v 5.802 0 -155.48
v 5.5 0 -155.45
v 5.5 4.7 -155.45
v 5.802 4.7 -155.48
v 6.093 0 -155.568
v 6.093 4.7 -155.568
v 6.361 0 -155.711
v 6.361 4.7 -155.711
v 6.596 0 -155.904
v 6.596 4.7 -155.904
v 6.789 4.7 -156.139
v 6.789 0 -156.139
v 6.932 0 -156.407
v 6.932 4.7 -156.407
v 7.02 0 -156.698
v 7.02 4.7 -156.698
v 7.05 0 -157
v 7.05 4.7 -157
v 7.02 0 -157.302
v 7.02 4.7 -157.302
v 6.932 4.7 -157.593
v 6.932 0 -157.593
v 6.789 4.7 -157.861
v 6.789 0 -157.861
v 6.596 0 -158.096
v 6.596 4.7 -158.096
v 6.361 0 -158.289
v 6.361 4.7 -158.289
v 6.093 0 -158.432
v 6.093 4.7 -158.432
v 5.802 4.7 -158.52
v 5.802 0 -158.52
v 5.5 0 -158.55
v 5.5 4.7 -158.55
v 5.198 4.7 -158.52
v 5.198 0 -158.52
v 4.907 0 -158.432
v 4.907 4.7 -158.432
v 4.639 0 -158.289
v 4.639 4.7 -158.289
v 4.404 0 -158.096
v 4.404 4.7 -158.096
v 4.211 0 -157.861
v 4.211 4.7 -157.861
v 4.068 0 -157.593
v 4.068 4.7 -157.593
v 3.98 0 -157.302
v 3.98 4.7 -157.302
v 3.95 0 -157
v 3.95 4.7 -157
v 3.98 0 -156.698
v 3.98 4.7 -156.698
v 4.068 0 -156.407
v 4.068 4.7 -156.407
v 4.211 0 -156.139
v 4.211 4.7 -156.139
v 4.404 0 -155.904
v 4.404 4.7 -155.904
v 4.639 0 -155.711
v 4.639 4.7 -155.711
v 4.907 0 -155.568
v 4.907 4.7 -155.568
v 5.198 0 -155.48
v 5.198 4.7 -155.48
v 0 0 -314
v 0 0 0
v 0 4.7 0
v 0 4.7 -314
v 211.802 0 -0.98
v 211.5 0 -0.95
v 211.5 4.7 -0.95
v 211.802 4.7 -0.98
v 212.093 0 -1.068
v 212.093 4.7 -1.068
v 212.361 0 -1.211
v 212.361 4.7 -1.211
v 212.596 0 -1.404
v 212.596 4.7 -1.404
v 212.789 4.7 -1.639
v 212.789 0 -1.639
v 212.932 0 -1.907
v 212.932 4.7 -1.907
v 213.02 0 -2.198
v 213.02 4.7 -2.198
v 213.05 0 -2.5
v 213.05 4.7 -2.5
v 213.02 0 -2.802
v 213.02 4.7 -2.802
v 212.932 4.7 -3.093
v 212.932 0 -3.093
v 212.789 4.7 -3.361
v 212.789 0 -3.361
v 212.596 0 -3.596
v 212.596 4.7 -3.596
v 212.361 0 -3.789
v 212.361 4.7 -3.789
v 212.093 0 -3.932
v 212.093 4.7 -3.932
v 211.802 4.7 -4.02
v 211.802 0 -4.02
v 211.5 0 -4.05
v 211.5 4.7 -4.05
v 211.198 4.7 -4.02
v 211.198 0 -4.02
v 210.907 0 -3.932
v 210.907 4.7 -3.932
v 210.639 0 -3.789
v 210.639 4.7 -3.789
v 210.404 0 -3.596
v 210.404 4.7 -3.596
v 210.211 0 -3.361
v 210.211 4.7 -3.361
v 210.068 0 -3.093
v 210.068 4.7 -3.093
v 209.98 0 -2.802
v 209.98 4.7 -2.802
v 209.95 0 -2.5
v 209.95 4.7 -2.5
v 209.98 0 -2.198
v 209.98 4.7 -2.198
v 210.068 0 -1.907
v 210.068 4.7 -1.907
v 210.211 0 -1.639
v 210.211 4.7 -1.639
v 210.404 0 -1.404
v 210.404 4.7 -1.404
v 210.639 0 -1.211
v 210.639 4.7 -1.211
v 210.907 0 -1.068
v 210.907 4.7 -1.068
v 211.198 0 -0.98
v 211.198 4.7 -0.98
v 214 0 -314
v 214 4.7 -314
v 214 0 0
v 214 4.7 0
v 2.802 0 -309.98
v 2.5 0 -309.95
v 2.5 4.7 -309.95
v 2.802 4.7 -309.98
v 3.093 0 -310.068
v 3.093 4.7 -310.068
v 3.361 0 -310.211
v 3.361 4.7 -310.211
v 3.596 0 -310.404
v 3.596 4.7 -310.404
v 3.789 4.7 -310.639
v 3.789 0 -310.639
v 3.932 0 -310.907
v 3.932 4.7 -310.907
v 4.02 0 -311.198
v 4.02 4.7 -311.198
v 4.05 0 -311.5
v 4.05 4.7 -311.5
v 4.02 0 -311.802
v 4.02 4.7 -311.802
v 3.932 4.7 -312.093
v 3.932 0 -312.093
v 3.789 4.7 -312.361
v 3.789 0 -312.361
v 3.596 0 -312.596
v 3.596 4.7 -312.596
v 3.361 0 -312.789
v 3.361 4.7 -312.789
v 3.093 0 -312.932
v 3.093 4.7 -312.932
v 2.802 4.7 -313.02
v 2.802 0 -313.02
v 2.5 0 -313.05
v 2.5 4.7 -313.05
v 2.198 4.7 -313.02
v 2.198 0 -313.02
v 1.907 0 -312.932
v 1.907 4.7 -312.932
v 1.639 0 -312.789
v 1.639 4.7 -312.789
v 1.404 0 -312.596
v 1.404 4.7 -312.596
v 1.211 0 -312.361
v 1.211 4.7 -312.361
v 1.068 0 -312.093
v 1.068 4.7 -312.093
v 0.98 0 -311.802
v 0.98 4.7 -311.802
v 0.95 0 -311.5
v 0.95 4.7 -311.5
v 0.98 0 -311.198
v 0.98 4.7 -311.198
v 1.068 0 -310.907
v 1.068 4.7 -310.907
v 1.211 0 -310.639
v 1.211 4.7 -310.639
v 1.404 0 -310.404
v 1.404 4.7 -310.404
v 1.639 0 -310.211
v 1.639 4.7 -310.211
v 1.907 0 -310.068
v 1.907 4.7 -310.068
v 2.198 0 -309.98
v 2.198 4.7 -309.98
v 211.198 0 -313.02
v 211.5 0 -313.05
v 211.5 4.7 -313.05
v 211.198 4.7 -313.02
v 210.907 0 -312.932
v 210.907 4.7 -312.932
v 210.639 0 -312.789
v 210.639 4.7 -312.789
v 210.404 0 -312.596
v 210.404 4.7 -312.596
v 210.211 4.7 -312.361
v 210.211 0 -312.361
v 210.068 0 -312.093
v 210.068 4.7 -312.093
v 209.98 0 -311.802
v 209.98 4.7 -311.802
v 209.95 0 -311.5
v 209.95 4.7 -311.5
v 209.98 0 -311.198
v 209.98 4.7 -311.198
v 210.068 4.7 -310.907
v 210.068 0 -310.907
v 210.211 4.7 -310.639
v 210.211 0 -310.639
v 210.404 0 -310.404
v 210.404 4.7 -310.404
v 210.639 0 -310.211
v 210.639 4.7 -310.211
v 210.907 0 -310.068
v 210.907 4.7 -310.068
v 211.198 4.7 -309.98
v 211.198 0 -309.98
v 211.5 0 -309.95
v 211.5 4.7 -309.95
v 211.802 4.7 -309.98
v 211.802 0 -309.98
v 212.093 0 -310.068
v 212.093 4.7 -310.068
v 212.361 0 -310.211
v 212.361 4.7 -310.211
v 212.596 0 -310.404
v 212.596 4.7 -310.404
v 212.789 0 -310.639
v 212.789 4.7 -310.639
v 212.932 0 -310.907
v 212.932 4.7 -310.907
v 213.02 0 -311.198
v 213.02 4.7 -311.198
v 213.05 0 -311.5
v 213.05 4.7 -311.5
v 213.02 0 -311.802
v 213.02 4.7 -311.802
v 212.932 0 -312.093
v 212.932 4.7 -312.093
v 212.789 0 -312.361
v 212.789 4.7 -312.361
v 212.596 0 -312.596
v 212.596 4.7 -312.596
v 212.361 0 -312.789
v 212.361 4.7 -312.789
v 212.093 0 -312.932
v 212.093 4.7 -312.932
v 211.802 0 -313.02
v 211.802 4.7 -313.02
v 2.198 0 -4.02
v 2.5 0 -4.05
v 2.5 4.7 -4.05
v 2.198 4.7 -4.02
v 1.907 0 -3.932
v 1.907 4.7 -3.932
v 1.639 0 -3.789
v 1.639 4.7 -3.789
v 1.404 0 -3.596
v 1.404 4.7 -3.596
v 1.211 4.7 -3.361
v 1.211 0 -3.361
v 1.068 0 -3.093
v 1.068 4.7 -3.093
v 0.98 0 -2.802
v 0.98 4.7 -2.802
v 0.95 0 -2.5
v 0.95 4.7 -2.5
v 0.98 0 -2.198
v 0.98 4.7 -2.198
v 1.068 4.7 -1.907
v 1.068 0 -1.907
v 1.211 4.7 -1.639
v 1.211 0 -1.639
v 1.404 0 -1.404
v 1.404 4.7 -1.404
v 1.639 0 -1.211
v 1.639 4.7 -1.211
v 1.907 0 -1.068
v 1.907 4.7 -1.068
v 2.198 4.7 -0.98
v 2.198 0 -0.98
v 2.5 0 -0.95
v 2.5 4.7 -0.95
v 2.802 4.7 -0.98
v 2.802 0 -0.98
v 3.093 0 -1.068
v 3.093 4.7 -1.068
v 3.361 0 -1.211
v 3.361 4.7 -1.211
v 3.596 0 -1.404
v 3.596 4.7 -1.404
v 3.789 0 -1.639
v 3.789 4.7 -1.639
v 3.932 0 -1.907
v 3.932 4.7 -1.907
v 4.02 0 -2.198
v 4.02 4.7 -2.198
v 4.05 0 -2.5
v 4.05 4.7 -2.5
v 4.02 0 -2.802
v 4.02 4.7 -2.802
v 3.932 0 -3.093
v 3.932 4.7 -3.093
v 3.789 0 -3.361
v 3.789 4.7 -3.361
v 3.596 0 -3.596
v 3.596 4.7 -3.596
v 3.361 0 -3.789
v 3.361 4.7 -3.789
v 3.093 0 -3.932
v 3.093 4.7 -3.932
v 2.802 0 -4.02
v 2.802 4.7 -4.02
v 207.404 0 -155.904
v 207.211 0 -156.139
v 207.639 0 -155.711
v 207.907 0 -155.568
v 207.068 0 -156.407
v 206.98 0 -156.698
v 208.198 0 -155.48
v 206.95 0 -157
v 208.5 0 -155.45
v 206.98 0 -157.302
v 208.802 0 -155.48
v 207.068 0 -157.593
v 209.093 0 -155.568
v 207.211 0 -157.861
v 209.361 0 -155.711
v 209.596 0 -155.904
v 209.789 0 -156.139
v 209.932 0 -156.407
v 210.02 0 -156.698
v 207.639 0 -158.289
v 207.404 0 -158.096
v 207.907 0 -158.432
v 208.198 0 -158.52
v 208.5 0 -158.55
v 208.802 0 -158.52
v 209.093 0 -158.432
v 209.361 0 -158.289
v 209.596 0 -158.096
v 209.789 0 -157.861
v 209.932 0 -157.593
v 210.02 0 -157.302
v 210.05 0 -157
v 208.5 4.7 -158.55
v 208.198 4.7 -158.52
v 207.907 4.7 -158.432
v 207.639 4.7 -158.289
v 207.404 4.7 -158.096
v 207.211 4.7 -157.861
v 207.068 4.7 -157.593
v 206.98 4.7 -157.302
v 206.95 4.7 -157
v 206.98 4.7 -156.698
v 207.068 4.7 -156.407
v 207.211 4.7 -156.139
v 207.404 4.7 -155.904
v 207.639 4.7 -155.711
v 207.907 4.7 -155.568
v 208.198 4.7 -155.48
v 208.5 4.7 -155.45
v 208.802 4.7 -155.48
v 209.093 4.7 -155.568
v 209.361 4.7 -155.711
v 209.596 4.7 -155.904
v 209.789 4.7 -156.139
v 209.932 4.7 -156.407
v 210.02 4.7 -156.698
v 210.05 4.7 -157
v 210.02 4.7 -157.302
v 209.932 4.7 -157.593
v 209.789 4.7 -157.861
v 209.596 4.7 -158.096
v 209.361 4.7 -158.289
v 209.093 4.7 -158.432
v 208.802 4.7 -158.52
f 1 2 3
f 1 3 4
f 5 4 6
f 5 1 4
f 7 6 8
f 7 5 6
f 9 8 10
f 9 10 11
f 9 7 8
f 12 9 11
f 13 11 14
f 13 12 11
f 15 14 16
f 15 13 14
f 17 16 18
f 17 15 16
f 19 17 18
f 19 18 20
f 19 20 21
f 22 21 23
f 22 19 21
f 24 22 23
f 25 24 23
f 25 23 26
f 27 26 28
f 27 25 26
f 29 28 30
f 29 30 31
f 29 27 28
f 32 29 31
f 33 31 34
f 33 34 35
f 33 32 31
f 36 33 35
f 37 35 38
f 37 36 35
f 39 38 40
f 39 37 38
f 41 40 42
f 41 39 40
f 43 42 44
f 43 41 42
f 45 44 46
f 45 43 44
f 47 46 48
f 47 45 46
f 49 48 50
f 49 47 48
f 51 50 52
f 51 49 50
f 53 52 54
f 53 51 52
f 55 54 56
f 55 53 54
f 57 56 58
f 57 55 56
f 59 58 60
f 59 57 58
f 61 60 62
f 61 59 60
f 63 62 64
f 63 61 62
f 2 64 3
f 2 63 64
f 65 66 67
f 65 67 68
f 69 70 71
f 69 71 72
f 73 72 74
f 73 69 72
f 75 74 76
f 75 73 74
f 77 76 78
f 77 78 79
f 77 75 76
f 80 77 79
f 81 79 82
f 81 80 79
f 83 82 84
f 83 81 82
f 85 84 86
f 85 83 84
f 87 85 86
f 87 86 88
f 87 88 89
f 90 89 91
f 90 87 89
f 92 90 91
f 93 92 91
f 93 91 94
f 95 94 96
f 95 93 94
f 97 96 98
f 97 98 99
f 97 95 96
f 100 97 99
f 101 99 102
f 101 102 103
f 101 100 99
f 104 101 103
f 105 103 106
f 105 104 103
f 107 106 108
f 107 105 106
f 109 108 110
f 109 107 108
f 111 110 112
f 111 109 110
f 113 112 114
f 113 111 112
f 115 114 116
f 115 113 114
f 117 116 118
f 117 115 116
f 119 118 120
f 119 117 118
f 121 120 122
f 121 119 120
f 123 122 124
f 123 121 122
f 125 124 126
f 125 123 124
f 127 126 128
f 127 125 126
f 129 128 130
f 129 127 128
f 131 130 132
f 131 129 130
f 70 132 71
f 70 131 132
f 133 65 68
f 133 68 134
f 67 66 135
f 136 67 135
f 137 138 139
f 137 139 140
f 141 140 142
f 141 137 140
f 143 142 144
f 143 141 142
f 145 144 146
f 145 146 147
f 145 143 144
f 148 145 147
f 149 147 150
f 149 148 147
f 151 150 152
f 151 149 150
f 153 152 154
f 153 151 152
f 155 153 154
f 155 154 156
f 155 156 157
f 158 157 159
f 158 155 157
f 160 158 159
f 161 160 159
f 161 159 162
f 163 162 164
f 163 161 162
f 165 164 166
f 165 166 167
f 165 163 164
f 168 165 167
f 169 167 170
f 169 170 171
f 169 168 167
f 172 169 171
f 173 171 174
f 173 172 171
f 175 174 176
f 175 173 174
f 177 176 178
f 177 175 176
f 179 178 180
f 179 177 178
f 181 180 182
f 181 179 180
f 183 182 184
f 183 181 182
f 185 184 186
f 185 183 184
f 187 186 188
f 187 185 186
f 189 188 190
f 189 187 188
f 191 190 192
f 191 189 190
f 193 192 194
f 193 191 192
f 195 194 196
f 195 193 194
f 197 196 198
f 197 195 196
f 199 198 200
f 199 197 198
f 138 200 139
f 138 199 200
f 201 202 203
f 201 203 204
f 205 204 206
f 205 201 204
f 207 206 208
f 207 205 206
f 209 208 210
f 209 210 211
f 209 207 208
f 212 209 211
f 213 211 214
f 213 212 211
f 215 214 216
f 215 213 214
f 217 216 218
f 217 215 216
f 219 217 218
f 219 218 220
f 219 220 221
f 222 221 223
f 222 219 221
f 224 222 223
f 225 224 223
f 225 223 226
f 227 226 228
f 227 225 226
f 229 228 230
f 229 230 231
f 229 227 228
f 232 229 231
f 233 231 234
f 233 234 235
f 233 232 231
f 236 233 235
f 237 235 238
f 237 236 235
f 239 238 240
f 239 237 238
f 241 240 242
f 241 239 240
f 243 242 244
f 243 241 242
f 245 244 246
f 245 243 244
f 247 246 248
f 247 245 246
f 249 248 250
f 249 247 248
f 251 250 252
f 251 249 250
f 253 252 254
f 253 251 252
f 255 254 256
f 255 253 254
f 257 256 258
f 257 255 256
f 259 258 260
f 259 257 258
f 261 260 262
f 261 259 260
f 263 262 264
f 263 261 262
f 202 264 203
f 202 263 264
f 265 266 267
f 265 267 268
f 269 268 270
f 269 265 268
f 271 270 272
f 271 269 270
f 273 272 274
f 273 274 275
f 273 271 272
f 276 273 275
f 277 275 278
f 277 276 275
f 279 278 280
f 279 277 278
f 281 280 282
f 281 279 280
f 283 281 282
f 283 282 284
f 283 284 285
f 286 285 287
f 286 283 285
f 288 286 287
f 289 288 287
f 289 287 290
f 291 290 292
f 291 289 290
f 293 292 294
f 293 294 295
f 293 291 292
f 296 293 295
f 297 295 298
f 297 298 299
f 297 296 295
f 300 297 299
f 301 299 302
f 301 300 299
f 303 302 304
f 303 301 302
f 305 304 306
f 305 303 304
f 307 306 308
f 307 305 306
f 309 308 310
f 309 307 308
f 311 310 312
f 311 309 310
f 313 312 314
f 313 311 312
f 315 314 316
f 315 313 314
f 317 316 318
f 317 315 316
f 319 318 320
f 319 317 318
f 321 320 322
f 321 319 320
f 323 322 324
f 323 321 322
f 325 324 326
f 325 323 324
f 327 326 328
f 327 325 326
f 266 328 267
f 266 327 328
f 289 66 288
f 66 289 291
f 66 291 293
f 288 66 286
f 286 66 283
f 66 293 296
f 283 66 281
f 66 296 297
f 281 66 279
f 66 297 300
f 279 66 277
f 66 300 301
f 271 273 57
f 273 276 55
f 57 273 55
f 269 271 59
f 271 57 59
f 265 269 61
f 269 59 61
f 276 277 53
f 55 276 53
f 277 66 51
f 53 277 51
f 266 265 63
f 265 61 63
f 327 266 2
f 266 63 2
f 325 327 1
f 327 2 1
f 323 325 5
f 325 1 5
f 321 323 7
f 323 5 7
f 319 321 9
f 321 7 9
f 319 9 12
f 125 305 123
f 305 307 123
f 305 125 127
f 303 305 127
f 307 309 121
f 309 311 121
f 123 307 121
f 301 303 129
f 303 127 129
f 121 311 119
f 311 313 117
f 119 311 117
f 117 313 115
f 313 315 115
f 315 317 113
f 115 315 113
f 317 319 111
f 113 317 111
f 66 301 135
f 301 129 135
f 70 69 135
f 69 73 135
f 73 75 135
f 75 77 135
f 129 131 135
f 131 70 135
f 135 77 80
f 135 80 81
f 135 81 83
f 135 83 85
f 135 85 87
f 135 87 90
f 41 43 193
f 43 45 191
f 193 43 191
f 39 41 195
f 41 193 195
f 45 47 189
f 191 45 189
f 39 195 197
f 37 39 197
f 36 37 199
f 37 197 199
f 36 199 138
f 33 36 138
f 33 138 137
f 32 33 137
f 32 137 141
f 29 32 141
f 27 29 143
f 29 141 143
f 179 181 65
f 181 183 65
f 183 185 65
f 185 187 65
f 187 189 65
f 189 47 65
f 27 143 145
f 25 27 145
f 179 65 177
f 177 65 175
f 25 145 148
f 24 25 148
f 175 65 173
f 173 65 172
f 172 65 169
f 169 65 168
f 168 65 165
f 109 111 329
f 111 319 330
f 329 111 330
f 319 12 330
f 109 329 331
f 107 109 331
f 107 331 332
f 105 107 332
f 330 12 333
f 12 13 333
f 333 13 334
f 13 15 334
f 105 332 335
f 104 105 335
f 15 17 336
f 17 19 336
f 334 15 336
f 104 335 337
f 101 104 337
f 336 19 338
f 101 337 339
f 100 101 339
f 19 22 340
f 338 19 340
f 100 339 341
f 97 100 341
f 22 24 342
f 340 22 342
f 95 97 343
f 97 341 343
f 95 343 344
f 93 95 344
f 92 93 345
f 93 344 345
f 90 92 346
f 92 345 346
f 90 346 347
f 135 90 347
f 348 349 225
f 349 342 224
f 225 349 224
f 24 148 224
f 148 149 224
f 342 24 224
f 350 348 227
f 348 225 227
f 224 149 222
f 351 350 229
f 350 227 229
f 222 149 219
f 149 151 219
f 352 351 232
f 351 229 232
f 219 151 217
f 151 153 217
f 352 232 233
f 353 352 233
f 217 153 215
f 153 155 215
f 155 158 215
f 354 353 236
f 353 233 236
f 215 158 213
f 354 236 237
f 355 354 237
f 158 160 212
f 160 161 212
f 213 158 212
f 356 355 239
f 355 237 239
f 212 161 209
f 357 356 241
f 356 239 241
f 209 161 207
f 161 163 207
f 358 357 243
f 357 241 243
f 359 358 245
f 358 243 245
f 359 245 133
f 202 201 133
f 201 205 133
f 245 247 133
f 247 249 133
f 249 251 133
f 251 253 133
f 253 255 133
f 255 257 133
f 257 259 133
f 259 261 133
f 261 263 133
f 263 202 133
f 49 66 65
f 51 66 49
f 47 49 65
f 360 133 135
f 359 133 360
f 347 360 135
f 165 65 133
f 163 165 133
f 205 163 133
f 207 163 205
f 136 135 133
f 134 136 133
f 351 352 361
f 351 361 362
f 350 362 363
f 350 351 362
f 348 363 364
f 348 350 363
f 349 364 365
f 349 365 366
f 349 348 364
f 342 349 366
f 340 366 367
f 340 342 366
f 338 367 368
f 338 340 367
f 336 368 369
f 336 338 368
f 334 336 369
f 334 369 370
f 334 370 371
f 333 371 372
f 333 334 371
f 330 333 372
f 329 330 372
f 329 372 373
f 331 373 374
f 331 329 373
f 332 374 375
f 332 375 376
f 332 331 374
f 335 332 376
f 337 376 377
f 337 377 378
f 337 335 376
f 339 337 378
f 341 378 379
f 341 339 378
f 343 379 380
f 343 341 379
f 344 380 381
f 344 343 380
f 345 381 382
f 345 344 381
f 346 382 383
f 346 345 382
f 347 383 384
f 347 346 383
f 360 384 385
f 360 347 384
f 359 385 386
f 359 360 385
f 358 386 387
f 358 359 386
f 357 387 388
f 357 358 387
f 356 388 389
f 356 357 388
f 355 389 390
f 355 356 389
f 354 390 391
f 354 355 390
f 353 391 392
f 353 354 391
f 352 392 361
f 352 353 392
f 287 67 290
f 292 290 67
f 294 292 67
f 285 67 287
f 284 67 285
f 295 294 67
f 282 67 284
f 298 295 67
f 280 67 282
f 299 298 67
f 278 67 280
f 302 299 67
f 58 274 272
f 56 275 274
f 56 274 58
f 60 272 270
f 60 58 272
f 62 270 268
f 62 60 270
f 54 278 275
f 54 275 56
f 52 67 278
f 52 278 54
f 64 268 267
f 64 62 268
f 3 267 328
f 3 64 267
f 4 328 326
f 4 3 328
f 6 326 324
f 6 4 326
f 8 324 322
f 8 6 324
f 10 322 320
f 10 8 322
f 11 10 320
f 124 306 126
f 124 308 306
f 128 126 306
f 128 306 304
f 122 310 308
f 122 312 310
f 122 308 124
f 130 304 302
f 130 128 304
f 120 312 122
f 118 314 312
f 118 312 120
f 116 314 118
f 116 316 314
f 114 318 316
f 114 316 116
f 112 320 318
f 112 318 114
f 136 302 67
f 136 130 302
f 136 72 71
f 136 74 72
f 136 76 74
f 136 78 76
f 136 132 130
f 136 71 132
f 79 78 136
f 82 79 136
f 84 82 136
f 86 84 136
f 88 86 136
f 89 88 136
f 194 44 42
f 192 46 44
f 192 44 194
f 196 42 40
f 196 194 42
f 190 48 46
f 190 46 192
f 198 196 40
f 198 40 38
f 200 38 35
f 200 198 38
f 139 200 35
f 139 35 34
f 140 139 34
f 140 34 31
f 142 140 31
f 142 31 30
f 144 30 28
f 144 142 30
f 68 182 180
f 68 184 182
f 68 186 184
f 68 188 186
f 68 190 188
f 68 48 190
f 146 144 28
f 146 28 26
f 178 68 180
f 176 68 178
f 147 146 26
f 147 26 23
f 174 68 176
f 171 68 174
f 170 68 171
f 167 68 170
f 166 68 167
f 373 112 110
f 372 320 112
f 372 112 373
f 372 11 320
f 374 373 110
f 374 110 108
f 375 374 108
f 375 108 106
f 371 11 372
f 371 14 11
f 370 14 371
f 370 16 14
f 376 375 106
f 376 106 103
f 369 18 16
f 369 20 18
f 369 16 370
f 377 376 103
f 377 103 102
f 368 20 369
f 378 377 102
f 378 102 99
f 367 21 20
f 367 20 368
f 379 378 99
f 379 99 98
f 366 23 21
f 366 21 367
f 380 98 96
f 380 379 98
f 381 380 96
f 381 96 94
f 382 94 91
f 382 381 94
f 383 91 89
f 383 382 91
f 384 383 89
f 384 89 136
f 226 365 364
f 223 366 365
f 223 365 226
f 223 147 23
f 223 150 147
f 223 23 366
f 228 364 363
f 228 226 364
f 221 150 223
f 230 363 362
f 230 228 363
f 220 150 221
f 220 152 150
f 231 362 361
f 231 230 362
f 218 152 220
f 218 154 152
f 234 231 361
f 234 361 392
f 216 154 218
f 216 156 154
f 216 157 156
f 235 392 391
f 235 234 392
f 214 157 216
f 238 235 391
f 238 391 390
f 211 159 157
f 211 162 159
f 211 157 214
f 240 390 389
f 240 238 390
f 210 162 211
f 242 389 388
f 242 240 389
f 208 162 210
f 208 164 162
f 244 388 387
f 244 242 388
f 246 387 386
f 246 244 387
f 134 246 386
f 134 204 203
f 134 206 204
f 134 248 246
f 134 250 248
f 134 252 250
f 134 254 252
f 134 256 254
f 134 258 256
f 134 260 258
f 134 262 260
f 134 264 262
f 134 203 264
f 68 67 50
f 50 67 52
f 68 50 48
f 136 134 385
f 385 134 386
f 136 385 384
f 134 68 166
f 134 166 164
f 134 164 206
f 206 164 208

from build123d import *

# Parameters (mm, degrees)
CROQUIS1_W              = 214
CROQUIS1_H              = 314
CROQUIS1_R              = 1.55
SALIENTE_EXTRUIR1_DEPTH = 4.7


with BuildPart() as part:
    # Croquis1 → Saliente-Extruir1 (new body)
    with BuildSketch(Plane(origin=(0, 0, 0), x_dir=(1, 0, 0), z_dir=(0, 1, 0))):
        with Locations((107, 157)):
            Rectangle(CROQUIS1_W, CROQUIS1_H)
        with Locations(Location((2.5, 311.5, 0), (0, 0, 270))):
            Circle(CROQUIS1_R, mode=Mode.SUBTRACT)
        with Locations(Location((211.5, 311.5, 0), (0, 0, 90))):
            Circle(CROQUIS1_R, mode=Mode.SUBTRACT)
        with Locations(Location((2.5, 2.5, 0), (0, 0, 90))):
            Circle(CROQUIS1_R, mode=Mode.SUBTRACT)
        with Locations(Location((211.5, 2.5, 0), (0, 0, 270))):
            Circle(CROQUIS1_R, mode=Mode.SUBTRACT)
        with Locations(Location((5.5, 157, 0), (0, 0, 270))):
            Circle(CROQUIS1_R, mode=Mode.SUBTRACT)
        with Locations(Location((208.5, 157, 0), (0, 0, 90))):
            Circle(CROQUIS1_R, mode=Mode.SUBTRACT)
    extrude(amount=SALIENTE_EXTRUIR1_DEPTH)


solid = part.part
